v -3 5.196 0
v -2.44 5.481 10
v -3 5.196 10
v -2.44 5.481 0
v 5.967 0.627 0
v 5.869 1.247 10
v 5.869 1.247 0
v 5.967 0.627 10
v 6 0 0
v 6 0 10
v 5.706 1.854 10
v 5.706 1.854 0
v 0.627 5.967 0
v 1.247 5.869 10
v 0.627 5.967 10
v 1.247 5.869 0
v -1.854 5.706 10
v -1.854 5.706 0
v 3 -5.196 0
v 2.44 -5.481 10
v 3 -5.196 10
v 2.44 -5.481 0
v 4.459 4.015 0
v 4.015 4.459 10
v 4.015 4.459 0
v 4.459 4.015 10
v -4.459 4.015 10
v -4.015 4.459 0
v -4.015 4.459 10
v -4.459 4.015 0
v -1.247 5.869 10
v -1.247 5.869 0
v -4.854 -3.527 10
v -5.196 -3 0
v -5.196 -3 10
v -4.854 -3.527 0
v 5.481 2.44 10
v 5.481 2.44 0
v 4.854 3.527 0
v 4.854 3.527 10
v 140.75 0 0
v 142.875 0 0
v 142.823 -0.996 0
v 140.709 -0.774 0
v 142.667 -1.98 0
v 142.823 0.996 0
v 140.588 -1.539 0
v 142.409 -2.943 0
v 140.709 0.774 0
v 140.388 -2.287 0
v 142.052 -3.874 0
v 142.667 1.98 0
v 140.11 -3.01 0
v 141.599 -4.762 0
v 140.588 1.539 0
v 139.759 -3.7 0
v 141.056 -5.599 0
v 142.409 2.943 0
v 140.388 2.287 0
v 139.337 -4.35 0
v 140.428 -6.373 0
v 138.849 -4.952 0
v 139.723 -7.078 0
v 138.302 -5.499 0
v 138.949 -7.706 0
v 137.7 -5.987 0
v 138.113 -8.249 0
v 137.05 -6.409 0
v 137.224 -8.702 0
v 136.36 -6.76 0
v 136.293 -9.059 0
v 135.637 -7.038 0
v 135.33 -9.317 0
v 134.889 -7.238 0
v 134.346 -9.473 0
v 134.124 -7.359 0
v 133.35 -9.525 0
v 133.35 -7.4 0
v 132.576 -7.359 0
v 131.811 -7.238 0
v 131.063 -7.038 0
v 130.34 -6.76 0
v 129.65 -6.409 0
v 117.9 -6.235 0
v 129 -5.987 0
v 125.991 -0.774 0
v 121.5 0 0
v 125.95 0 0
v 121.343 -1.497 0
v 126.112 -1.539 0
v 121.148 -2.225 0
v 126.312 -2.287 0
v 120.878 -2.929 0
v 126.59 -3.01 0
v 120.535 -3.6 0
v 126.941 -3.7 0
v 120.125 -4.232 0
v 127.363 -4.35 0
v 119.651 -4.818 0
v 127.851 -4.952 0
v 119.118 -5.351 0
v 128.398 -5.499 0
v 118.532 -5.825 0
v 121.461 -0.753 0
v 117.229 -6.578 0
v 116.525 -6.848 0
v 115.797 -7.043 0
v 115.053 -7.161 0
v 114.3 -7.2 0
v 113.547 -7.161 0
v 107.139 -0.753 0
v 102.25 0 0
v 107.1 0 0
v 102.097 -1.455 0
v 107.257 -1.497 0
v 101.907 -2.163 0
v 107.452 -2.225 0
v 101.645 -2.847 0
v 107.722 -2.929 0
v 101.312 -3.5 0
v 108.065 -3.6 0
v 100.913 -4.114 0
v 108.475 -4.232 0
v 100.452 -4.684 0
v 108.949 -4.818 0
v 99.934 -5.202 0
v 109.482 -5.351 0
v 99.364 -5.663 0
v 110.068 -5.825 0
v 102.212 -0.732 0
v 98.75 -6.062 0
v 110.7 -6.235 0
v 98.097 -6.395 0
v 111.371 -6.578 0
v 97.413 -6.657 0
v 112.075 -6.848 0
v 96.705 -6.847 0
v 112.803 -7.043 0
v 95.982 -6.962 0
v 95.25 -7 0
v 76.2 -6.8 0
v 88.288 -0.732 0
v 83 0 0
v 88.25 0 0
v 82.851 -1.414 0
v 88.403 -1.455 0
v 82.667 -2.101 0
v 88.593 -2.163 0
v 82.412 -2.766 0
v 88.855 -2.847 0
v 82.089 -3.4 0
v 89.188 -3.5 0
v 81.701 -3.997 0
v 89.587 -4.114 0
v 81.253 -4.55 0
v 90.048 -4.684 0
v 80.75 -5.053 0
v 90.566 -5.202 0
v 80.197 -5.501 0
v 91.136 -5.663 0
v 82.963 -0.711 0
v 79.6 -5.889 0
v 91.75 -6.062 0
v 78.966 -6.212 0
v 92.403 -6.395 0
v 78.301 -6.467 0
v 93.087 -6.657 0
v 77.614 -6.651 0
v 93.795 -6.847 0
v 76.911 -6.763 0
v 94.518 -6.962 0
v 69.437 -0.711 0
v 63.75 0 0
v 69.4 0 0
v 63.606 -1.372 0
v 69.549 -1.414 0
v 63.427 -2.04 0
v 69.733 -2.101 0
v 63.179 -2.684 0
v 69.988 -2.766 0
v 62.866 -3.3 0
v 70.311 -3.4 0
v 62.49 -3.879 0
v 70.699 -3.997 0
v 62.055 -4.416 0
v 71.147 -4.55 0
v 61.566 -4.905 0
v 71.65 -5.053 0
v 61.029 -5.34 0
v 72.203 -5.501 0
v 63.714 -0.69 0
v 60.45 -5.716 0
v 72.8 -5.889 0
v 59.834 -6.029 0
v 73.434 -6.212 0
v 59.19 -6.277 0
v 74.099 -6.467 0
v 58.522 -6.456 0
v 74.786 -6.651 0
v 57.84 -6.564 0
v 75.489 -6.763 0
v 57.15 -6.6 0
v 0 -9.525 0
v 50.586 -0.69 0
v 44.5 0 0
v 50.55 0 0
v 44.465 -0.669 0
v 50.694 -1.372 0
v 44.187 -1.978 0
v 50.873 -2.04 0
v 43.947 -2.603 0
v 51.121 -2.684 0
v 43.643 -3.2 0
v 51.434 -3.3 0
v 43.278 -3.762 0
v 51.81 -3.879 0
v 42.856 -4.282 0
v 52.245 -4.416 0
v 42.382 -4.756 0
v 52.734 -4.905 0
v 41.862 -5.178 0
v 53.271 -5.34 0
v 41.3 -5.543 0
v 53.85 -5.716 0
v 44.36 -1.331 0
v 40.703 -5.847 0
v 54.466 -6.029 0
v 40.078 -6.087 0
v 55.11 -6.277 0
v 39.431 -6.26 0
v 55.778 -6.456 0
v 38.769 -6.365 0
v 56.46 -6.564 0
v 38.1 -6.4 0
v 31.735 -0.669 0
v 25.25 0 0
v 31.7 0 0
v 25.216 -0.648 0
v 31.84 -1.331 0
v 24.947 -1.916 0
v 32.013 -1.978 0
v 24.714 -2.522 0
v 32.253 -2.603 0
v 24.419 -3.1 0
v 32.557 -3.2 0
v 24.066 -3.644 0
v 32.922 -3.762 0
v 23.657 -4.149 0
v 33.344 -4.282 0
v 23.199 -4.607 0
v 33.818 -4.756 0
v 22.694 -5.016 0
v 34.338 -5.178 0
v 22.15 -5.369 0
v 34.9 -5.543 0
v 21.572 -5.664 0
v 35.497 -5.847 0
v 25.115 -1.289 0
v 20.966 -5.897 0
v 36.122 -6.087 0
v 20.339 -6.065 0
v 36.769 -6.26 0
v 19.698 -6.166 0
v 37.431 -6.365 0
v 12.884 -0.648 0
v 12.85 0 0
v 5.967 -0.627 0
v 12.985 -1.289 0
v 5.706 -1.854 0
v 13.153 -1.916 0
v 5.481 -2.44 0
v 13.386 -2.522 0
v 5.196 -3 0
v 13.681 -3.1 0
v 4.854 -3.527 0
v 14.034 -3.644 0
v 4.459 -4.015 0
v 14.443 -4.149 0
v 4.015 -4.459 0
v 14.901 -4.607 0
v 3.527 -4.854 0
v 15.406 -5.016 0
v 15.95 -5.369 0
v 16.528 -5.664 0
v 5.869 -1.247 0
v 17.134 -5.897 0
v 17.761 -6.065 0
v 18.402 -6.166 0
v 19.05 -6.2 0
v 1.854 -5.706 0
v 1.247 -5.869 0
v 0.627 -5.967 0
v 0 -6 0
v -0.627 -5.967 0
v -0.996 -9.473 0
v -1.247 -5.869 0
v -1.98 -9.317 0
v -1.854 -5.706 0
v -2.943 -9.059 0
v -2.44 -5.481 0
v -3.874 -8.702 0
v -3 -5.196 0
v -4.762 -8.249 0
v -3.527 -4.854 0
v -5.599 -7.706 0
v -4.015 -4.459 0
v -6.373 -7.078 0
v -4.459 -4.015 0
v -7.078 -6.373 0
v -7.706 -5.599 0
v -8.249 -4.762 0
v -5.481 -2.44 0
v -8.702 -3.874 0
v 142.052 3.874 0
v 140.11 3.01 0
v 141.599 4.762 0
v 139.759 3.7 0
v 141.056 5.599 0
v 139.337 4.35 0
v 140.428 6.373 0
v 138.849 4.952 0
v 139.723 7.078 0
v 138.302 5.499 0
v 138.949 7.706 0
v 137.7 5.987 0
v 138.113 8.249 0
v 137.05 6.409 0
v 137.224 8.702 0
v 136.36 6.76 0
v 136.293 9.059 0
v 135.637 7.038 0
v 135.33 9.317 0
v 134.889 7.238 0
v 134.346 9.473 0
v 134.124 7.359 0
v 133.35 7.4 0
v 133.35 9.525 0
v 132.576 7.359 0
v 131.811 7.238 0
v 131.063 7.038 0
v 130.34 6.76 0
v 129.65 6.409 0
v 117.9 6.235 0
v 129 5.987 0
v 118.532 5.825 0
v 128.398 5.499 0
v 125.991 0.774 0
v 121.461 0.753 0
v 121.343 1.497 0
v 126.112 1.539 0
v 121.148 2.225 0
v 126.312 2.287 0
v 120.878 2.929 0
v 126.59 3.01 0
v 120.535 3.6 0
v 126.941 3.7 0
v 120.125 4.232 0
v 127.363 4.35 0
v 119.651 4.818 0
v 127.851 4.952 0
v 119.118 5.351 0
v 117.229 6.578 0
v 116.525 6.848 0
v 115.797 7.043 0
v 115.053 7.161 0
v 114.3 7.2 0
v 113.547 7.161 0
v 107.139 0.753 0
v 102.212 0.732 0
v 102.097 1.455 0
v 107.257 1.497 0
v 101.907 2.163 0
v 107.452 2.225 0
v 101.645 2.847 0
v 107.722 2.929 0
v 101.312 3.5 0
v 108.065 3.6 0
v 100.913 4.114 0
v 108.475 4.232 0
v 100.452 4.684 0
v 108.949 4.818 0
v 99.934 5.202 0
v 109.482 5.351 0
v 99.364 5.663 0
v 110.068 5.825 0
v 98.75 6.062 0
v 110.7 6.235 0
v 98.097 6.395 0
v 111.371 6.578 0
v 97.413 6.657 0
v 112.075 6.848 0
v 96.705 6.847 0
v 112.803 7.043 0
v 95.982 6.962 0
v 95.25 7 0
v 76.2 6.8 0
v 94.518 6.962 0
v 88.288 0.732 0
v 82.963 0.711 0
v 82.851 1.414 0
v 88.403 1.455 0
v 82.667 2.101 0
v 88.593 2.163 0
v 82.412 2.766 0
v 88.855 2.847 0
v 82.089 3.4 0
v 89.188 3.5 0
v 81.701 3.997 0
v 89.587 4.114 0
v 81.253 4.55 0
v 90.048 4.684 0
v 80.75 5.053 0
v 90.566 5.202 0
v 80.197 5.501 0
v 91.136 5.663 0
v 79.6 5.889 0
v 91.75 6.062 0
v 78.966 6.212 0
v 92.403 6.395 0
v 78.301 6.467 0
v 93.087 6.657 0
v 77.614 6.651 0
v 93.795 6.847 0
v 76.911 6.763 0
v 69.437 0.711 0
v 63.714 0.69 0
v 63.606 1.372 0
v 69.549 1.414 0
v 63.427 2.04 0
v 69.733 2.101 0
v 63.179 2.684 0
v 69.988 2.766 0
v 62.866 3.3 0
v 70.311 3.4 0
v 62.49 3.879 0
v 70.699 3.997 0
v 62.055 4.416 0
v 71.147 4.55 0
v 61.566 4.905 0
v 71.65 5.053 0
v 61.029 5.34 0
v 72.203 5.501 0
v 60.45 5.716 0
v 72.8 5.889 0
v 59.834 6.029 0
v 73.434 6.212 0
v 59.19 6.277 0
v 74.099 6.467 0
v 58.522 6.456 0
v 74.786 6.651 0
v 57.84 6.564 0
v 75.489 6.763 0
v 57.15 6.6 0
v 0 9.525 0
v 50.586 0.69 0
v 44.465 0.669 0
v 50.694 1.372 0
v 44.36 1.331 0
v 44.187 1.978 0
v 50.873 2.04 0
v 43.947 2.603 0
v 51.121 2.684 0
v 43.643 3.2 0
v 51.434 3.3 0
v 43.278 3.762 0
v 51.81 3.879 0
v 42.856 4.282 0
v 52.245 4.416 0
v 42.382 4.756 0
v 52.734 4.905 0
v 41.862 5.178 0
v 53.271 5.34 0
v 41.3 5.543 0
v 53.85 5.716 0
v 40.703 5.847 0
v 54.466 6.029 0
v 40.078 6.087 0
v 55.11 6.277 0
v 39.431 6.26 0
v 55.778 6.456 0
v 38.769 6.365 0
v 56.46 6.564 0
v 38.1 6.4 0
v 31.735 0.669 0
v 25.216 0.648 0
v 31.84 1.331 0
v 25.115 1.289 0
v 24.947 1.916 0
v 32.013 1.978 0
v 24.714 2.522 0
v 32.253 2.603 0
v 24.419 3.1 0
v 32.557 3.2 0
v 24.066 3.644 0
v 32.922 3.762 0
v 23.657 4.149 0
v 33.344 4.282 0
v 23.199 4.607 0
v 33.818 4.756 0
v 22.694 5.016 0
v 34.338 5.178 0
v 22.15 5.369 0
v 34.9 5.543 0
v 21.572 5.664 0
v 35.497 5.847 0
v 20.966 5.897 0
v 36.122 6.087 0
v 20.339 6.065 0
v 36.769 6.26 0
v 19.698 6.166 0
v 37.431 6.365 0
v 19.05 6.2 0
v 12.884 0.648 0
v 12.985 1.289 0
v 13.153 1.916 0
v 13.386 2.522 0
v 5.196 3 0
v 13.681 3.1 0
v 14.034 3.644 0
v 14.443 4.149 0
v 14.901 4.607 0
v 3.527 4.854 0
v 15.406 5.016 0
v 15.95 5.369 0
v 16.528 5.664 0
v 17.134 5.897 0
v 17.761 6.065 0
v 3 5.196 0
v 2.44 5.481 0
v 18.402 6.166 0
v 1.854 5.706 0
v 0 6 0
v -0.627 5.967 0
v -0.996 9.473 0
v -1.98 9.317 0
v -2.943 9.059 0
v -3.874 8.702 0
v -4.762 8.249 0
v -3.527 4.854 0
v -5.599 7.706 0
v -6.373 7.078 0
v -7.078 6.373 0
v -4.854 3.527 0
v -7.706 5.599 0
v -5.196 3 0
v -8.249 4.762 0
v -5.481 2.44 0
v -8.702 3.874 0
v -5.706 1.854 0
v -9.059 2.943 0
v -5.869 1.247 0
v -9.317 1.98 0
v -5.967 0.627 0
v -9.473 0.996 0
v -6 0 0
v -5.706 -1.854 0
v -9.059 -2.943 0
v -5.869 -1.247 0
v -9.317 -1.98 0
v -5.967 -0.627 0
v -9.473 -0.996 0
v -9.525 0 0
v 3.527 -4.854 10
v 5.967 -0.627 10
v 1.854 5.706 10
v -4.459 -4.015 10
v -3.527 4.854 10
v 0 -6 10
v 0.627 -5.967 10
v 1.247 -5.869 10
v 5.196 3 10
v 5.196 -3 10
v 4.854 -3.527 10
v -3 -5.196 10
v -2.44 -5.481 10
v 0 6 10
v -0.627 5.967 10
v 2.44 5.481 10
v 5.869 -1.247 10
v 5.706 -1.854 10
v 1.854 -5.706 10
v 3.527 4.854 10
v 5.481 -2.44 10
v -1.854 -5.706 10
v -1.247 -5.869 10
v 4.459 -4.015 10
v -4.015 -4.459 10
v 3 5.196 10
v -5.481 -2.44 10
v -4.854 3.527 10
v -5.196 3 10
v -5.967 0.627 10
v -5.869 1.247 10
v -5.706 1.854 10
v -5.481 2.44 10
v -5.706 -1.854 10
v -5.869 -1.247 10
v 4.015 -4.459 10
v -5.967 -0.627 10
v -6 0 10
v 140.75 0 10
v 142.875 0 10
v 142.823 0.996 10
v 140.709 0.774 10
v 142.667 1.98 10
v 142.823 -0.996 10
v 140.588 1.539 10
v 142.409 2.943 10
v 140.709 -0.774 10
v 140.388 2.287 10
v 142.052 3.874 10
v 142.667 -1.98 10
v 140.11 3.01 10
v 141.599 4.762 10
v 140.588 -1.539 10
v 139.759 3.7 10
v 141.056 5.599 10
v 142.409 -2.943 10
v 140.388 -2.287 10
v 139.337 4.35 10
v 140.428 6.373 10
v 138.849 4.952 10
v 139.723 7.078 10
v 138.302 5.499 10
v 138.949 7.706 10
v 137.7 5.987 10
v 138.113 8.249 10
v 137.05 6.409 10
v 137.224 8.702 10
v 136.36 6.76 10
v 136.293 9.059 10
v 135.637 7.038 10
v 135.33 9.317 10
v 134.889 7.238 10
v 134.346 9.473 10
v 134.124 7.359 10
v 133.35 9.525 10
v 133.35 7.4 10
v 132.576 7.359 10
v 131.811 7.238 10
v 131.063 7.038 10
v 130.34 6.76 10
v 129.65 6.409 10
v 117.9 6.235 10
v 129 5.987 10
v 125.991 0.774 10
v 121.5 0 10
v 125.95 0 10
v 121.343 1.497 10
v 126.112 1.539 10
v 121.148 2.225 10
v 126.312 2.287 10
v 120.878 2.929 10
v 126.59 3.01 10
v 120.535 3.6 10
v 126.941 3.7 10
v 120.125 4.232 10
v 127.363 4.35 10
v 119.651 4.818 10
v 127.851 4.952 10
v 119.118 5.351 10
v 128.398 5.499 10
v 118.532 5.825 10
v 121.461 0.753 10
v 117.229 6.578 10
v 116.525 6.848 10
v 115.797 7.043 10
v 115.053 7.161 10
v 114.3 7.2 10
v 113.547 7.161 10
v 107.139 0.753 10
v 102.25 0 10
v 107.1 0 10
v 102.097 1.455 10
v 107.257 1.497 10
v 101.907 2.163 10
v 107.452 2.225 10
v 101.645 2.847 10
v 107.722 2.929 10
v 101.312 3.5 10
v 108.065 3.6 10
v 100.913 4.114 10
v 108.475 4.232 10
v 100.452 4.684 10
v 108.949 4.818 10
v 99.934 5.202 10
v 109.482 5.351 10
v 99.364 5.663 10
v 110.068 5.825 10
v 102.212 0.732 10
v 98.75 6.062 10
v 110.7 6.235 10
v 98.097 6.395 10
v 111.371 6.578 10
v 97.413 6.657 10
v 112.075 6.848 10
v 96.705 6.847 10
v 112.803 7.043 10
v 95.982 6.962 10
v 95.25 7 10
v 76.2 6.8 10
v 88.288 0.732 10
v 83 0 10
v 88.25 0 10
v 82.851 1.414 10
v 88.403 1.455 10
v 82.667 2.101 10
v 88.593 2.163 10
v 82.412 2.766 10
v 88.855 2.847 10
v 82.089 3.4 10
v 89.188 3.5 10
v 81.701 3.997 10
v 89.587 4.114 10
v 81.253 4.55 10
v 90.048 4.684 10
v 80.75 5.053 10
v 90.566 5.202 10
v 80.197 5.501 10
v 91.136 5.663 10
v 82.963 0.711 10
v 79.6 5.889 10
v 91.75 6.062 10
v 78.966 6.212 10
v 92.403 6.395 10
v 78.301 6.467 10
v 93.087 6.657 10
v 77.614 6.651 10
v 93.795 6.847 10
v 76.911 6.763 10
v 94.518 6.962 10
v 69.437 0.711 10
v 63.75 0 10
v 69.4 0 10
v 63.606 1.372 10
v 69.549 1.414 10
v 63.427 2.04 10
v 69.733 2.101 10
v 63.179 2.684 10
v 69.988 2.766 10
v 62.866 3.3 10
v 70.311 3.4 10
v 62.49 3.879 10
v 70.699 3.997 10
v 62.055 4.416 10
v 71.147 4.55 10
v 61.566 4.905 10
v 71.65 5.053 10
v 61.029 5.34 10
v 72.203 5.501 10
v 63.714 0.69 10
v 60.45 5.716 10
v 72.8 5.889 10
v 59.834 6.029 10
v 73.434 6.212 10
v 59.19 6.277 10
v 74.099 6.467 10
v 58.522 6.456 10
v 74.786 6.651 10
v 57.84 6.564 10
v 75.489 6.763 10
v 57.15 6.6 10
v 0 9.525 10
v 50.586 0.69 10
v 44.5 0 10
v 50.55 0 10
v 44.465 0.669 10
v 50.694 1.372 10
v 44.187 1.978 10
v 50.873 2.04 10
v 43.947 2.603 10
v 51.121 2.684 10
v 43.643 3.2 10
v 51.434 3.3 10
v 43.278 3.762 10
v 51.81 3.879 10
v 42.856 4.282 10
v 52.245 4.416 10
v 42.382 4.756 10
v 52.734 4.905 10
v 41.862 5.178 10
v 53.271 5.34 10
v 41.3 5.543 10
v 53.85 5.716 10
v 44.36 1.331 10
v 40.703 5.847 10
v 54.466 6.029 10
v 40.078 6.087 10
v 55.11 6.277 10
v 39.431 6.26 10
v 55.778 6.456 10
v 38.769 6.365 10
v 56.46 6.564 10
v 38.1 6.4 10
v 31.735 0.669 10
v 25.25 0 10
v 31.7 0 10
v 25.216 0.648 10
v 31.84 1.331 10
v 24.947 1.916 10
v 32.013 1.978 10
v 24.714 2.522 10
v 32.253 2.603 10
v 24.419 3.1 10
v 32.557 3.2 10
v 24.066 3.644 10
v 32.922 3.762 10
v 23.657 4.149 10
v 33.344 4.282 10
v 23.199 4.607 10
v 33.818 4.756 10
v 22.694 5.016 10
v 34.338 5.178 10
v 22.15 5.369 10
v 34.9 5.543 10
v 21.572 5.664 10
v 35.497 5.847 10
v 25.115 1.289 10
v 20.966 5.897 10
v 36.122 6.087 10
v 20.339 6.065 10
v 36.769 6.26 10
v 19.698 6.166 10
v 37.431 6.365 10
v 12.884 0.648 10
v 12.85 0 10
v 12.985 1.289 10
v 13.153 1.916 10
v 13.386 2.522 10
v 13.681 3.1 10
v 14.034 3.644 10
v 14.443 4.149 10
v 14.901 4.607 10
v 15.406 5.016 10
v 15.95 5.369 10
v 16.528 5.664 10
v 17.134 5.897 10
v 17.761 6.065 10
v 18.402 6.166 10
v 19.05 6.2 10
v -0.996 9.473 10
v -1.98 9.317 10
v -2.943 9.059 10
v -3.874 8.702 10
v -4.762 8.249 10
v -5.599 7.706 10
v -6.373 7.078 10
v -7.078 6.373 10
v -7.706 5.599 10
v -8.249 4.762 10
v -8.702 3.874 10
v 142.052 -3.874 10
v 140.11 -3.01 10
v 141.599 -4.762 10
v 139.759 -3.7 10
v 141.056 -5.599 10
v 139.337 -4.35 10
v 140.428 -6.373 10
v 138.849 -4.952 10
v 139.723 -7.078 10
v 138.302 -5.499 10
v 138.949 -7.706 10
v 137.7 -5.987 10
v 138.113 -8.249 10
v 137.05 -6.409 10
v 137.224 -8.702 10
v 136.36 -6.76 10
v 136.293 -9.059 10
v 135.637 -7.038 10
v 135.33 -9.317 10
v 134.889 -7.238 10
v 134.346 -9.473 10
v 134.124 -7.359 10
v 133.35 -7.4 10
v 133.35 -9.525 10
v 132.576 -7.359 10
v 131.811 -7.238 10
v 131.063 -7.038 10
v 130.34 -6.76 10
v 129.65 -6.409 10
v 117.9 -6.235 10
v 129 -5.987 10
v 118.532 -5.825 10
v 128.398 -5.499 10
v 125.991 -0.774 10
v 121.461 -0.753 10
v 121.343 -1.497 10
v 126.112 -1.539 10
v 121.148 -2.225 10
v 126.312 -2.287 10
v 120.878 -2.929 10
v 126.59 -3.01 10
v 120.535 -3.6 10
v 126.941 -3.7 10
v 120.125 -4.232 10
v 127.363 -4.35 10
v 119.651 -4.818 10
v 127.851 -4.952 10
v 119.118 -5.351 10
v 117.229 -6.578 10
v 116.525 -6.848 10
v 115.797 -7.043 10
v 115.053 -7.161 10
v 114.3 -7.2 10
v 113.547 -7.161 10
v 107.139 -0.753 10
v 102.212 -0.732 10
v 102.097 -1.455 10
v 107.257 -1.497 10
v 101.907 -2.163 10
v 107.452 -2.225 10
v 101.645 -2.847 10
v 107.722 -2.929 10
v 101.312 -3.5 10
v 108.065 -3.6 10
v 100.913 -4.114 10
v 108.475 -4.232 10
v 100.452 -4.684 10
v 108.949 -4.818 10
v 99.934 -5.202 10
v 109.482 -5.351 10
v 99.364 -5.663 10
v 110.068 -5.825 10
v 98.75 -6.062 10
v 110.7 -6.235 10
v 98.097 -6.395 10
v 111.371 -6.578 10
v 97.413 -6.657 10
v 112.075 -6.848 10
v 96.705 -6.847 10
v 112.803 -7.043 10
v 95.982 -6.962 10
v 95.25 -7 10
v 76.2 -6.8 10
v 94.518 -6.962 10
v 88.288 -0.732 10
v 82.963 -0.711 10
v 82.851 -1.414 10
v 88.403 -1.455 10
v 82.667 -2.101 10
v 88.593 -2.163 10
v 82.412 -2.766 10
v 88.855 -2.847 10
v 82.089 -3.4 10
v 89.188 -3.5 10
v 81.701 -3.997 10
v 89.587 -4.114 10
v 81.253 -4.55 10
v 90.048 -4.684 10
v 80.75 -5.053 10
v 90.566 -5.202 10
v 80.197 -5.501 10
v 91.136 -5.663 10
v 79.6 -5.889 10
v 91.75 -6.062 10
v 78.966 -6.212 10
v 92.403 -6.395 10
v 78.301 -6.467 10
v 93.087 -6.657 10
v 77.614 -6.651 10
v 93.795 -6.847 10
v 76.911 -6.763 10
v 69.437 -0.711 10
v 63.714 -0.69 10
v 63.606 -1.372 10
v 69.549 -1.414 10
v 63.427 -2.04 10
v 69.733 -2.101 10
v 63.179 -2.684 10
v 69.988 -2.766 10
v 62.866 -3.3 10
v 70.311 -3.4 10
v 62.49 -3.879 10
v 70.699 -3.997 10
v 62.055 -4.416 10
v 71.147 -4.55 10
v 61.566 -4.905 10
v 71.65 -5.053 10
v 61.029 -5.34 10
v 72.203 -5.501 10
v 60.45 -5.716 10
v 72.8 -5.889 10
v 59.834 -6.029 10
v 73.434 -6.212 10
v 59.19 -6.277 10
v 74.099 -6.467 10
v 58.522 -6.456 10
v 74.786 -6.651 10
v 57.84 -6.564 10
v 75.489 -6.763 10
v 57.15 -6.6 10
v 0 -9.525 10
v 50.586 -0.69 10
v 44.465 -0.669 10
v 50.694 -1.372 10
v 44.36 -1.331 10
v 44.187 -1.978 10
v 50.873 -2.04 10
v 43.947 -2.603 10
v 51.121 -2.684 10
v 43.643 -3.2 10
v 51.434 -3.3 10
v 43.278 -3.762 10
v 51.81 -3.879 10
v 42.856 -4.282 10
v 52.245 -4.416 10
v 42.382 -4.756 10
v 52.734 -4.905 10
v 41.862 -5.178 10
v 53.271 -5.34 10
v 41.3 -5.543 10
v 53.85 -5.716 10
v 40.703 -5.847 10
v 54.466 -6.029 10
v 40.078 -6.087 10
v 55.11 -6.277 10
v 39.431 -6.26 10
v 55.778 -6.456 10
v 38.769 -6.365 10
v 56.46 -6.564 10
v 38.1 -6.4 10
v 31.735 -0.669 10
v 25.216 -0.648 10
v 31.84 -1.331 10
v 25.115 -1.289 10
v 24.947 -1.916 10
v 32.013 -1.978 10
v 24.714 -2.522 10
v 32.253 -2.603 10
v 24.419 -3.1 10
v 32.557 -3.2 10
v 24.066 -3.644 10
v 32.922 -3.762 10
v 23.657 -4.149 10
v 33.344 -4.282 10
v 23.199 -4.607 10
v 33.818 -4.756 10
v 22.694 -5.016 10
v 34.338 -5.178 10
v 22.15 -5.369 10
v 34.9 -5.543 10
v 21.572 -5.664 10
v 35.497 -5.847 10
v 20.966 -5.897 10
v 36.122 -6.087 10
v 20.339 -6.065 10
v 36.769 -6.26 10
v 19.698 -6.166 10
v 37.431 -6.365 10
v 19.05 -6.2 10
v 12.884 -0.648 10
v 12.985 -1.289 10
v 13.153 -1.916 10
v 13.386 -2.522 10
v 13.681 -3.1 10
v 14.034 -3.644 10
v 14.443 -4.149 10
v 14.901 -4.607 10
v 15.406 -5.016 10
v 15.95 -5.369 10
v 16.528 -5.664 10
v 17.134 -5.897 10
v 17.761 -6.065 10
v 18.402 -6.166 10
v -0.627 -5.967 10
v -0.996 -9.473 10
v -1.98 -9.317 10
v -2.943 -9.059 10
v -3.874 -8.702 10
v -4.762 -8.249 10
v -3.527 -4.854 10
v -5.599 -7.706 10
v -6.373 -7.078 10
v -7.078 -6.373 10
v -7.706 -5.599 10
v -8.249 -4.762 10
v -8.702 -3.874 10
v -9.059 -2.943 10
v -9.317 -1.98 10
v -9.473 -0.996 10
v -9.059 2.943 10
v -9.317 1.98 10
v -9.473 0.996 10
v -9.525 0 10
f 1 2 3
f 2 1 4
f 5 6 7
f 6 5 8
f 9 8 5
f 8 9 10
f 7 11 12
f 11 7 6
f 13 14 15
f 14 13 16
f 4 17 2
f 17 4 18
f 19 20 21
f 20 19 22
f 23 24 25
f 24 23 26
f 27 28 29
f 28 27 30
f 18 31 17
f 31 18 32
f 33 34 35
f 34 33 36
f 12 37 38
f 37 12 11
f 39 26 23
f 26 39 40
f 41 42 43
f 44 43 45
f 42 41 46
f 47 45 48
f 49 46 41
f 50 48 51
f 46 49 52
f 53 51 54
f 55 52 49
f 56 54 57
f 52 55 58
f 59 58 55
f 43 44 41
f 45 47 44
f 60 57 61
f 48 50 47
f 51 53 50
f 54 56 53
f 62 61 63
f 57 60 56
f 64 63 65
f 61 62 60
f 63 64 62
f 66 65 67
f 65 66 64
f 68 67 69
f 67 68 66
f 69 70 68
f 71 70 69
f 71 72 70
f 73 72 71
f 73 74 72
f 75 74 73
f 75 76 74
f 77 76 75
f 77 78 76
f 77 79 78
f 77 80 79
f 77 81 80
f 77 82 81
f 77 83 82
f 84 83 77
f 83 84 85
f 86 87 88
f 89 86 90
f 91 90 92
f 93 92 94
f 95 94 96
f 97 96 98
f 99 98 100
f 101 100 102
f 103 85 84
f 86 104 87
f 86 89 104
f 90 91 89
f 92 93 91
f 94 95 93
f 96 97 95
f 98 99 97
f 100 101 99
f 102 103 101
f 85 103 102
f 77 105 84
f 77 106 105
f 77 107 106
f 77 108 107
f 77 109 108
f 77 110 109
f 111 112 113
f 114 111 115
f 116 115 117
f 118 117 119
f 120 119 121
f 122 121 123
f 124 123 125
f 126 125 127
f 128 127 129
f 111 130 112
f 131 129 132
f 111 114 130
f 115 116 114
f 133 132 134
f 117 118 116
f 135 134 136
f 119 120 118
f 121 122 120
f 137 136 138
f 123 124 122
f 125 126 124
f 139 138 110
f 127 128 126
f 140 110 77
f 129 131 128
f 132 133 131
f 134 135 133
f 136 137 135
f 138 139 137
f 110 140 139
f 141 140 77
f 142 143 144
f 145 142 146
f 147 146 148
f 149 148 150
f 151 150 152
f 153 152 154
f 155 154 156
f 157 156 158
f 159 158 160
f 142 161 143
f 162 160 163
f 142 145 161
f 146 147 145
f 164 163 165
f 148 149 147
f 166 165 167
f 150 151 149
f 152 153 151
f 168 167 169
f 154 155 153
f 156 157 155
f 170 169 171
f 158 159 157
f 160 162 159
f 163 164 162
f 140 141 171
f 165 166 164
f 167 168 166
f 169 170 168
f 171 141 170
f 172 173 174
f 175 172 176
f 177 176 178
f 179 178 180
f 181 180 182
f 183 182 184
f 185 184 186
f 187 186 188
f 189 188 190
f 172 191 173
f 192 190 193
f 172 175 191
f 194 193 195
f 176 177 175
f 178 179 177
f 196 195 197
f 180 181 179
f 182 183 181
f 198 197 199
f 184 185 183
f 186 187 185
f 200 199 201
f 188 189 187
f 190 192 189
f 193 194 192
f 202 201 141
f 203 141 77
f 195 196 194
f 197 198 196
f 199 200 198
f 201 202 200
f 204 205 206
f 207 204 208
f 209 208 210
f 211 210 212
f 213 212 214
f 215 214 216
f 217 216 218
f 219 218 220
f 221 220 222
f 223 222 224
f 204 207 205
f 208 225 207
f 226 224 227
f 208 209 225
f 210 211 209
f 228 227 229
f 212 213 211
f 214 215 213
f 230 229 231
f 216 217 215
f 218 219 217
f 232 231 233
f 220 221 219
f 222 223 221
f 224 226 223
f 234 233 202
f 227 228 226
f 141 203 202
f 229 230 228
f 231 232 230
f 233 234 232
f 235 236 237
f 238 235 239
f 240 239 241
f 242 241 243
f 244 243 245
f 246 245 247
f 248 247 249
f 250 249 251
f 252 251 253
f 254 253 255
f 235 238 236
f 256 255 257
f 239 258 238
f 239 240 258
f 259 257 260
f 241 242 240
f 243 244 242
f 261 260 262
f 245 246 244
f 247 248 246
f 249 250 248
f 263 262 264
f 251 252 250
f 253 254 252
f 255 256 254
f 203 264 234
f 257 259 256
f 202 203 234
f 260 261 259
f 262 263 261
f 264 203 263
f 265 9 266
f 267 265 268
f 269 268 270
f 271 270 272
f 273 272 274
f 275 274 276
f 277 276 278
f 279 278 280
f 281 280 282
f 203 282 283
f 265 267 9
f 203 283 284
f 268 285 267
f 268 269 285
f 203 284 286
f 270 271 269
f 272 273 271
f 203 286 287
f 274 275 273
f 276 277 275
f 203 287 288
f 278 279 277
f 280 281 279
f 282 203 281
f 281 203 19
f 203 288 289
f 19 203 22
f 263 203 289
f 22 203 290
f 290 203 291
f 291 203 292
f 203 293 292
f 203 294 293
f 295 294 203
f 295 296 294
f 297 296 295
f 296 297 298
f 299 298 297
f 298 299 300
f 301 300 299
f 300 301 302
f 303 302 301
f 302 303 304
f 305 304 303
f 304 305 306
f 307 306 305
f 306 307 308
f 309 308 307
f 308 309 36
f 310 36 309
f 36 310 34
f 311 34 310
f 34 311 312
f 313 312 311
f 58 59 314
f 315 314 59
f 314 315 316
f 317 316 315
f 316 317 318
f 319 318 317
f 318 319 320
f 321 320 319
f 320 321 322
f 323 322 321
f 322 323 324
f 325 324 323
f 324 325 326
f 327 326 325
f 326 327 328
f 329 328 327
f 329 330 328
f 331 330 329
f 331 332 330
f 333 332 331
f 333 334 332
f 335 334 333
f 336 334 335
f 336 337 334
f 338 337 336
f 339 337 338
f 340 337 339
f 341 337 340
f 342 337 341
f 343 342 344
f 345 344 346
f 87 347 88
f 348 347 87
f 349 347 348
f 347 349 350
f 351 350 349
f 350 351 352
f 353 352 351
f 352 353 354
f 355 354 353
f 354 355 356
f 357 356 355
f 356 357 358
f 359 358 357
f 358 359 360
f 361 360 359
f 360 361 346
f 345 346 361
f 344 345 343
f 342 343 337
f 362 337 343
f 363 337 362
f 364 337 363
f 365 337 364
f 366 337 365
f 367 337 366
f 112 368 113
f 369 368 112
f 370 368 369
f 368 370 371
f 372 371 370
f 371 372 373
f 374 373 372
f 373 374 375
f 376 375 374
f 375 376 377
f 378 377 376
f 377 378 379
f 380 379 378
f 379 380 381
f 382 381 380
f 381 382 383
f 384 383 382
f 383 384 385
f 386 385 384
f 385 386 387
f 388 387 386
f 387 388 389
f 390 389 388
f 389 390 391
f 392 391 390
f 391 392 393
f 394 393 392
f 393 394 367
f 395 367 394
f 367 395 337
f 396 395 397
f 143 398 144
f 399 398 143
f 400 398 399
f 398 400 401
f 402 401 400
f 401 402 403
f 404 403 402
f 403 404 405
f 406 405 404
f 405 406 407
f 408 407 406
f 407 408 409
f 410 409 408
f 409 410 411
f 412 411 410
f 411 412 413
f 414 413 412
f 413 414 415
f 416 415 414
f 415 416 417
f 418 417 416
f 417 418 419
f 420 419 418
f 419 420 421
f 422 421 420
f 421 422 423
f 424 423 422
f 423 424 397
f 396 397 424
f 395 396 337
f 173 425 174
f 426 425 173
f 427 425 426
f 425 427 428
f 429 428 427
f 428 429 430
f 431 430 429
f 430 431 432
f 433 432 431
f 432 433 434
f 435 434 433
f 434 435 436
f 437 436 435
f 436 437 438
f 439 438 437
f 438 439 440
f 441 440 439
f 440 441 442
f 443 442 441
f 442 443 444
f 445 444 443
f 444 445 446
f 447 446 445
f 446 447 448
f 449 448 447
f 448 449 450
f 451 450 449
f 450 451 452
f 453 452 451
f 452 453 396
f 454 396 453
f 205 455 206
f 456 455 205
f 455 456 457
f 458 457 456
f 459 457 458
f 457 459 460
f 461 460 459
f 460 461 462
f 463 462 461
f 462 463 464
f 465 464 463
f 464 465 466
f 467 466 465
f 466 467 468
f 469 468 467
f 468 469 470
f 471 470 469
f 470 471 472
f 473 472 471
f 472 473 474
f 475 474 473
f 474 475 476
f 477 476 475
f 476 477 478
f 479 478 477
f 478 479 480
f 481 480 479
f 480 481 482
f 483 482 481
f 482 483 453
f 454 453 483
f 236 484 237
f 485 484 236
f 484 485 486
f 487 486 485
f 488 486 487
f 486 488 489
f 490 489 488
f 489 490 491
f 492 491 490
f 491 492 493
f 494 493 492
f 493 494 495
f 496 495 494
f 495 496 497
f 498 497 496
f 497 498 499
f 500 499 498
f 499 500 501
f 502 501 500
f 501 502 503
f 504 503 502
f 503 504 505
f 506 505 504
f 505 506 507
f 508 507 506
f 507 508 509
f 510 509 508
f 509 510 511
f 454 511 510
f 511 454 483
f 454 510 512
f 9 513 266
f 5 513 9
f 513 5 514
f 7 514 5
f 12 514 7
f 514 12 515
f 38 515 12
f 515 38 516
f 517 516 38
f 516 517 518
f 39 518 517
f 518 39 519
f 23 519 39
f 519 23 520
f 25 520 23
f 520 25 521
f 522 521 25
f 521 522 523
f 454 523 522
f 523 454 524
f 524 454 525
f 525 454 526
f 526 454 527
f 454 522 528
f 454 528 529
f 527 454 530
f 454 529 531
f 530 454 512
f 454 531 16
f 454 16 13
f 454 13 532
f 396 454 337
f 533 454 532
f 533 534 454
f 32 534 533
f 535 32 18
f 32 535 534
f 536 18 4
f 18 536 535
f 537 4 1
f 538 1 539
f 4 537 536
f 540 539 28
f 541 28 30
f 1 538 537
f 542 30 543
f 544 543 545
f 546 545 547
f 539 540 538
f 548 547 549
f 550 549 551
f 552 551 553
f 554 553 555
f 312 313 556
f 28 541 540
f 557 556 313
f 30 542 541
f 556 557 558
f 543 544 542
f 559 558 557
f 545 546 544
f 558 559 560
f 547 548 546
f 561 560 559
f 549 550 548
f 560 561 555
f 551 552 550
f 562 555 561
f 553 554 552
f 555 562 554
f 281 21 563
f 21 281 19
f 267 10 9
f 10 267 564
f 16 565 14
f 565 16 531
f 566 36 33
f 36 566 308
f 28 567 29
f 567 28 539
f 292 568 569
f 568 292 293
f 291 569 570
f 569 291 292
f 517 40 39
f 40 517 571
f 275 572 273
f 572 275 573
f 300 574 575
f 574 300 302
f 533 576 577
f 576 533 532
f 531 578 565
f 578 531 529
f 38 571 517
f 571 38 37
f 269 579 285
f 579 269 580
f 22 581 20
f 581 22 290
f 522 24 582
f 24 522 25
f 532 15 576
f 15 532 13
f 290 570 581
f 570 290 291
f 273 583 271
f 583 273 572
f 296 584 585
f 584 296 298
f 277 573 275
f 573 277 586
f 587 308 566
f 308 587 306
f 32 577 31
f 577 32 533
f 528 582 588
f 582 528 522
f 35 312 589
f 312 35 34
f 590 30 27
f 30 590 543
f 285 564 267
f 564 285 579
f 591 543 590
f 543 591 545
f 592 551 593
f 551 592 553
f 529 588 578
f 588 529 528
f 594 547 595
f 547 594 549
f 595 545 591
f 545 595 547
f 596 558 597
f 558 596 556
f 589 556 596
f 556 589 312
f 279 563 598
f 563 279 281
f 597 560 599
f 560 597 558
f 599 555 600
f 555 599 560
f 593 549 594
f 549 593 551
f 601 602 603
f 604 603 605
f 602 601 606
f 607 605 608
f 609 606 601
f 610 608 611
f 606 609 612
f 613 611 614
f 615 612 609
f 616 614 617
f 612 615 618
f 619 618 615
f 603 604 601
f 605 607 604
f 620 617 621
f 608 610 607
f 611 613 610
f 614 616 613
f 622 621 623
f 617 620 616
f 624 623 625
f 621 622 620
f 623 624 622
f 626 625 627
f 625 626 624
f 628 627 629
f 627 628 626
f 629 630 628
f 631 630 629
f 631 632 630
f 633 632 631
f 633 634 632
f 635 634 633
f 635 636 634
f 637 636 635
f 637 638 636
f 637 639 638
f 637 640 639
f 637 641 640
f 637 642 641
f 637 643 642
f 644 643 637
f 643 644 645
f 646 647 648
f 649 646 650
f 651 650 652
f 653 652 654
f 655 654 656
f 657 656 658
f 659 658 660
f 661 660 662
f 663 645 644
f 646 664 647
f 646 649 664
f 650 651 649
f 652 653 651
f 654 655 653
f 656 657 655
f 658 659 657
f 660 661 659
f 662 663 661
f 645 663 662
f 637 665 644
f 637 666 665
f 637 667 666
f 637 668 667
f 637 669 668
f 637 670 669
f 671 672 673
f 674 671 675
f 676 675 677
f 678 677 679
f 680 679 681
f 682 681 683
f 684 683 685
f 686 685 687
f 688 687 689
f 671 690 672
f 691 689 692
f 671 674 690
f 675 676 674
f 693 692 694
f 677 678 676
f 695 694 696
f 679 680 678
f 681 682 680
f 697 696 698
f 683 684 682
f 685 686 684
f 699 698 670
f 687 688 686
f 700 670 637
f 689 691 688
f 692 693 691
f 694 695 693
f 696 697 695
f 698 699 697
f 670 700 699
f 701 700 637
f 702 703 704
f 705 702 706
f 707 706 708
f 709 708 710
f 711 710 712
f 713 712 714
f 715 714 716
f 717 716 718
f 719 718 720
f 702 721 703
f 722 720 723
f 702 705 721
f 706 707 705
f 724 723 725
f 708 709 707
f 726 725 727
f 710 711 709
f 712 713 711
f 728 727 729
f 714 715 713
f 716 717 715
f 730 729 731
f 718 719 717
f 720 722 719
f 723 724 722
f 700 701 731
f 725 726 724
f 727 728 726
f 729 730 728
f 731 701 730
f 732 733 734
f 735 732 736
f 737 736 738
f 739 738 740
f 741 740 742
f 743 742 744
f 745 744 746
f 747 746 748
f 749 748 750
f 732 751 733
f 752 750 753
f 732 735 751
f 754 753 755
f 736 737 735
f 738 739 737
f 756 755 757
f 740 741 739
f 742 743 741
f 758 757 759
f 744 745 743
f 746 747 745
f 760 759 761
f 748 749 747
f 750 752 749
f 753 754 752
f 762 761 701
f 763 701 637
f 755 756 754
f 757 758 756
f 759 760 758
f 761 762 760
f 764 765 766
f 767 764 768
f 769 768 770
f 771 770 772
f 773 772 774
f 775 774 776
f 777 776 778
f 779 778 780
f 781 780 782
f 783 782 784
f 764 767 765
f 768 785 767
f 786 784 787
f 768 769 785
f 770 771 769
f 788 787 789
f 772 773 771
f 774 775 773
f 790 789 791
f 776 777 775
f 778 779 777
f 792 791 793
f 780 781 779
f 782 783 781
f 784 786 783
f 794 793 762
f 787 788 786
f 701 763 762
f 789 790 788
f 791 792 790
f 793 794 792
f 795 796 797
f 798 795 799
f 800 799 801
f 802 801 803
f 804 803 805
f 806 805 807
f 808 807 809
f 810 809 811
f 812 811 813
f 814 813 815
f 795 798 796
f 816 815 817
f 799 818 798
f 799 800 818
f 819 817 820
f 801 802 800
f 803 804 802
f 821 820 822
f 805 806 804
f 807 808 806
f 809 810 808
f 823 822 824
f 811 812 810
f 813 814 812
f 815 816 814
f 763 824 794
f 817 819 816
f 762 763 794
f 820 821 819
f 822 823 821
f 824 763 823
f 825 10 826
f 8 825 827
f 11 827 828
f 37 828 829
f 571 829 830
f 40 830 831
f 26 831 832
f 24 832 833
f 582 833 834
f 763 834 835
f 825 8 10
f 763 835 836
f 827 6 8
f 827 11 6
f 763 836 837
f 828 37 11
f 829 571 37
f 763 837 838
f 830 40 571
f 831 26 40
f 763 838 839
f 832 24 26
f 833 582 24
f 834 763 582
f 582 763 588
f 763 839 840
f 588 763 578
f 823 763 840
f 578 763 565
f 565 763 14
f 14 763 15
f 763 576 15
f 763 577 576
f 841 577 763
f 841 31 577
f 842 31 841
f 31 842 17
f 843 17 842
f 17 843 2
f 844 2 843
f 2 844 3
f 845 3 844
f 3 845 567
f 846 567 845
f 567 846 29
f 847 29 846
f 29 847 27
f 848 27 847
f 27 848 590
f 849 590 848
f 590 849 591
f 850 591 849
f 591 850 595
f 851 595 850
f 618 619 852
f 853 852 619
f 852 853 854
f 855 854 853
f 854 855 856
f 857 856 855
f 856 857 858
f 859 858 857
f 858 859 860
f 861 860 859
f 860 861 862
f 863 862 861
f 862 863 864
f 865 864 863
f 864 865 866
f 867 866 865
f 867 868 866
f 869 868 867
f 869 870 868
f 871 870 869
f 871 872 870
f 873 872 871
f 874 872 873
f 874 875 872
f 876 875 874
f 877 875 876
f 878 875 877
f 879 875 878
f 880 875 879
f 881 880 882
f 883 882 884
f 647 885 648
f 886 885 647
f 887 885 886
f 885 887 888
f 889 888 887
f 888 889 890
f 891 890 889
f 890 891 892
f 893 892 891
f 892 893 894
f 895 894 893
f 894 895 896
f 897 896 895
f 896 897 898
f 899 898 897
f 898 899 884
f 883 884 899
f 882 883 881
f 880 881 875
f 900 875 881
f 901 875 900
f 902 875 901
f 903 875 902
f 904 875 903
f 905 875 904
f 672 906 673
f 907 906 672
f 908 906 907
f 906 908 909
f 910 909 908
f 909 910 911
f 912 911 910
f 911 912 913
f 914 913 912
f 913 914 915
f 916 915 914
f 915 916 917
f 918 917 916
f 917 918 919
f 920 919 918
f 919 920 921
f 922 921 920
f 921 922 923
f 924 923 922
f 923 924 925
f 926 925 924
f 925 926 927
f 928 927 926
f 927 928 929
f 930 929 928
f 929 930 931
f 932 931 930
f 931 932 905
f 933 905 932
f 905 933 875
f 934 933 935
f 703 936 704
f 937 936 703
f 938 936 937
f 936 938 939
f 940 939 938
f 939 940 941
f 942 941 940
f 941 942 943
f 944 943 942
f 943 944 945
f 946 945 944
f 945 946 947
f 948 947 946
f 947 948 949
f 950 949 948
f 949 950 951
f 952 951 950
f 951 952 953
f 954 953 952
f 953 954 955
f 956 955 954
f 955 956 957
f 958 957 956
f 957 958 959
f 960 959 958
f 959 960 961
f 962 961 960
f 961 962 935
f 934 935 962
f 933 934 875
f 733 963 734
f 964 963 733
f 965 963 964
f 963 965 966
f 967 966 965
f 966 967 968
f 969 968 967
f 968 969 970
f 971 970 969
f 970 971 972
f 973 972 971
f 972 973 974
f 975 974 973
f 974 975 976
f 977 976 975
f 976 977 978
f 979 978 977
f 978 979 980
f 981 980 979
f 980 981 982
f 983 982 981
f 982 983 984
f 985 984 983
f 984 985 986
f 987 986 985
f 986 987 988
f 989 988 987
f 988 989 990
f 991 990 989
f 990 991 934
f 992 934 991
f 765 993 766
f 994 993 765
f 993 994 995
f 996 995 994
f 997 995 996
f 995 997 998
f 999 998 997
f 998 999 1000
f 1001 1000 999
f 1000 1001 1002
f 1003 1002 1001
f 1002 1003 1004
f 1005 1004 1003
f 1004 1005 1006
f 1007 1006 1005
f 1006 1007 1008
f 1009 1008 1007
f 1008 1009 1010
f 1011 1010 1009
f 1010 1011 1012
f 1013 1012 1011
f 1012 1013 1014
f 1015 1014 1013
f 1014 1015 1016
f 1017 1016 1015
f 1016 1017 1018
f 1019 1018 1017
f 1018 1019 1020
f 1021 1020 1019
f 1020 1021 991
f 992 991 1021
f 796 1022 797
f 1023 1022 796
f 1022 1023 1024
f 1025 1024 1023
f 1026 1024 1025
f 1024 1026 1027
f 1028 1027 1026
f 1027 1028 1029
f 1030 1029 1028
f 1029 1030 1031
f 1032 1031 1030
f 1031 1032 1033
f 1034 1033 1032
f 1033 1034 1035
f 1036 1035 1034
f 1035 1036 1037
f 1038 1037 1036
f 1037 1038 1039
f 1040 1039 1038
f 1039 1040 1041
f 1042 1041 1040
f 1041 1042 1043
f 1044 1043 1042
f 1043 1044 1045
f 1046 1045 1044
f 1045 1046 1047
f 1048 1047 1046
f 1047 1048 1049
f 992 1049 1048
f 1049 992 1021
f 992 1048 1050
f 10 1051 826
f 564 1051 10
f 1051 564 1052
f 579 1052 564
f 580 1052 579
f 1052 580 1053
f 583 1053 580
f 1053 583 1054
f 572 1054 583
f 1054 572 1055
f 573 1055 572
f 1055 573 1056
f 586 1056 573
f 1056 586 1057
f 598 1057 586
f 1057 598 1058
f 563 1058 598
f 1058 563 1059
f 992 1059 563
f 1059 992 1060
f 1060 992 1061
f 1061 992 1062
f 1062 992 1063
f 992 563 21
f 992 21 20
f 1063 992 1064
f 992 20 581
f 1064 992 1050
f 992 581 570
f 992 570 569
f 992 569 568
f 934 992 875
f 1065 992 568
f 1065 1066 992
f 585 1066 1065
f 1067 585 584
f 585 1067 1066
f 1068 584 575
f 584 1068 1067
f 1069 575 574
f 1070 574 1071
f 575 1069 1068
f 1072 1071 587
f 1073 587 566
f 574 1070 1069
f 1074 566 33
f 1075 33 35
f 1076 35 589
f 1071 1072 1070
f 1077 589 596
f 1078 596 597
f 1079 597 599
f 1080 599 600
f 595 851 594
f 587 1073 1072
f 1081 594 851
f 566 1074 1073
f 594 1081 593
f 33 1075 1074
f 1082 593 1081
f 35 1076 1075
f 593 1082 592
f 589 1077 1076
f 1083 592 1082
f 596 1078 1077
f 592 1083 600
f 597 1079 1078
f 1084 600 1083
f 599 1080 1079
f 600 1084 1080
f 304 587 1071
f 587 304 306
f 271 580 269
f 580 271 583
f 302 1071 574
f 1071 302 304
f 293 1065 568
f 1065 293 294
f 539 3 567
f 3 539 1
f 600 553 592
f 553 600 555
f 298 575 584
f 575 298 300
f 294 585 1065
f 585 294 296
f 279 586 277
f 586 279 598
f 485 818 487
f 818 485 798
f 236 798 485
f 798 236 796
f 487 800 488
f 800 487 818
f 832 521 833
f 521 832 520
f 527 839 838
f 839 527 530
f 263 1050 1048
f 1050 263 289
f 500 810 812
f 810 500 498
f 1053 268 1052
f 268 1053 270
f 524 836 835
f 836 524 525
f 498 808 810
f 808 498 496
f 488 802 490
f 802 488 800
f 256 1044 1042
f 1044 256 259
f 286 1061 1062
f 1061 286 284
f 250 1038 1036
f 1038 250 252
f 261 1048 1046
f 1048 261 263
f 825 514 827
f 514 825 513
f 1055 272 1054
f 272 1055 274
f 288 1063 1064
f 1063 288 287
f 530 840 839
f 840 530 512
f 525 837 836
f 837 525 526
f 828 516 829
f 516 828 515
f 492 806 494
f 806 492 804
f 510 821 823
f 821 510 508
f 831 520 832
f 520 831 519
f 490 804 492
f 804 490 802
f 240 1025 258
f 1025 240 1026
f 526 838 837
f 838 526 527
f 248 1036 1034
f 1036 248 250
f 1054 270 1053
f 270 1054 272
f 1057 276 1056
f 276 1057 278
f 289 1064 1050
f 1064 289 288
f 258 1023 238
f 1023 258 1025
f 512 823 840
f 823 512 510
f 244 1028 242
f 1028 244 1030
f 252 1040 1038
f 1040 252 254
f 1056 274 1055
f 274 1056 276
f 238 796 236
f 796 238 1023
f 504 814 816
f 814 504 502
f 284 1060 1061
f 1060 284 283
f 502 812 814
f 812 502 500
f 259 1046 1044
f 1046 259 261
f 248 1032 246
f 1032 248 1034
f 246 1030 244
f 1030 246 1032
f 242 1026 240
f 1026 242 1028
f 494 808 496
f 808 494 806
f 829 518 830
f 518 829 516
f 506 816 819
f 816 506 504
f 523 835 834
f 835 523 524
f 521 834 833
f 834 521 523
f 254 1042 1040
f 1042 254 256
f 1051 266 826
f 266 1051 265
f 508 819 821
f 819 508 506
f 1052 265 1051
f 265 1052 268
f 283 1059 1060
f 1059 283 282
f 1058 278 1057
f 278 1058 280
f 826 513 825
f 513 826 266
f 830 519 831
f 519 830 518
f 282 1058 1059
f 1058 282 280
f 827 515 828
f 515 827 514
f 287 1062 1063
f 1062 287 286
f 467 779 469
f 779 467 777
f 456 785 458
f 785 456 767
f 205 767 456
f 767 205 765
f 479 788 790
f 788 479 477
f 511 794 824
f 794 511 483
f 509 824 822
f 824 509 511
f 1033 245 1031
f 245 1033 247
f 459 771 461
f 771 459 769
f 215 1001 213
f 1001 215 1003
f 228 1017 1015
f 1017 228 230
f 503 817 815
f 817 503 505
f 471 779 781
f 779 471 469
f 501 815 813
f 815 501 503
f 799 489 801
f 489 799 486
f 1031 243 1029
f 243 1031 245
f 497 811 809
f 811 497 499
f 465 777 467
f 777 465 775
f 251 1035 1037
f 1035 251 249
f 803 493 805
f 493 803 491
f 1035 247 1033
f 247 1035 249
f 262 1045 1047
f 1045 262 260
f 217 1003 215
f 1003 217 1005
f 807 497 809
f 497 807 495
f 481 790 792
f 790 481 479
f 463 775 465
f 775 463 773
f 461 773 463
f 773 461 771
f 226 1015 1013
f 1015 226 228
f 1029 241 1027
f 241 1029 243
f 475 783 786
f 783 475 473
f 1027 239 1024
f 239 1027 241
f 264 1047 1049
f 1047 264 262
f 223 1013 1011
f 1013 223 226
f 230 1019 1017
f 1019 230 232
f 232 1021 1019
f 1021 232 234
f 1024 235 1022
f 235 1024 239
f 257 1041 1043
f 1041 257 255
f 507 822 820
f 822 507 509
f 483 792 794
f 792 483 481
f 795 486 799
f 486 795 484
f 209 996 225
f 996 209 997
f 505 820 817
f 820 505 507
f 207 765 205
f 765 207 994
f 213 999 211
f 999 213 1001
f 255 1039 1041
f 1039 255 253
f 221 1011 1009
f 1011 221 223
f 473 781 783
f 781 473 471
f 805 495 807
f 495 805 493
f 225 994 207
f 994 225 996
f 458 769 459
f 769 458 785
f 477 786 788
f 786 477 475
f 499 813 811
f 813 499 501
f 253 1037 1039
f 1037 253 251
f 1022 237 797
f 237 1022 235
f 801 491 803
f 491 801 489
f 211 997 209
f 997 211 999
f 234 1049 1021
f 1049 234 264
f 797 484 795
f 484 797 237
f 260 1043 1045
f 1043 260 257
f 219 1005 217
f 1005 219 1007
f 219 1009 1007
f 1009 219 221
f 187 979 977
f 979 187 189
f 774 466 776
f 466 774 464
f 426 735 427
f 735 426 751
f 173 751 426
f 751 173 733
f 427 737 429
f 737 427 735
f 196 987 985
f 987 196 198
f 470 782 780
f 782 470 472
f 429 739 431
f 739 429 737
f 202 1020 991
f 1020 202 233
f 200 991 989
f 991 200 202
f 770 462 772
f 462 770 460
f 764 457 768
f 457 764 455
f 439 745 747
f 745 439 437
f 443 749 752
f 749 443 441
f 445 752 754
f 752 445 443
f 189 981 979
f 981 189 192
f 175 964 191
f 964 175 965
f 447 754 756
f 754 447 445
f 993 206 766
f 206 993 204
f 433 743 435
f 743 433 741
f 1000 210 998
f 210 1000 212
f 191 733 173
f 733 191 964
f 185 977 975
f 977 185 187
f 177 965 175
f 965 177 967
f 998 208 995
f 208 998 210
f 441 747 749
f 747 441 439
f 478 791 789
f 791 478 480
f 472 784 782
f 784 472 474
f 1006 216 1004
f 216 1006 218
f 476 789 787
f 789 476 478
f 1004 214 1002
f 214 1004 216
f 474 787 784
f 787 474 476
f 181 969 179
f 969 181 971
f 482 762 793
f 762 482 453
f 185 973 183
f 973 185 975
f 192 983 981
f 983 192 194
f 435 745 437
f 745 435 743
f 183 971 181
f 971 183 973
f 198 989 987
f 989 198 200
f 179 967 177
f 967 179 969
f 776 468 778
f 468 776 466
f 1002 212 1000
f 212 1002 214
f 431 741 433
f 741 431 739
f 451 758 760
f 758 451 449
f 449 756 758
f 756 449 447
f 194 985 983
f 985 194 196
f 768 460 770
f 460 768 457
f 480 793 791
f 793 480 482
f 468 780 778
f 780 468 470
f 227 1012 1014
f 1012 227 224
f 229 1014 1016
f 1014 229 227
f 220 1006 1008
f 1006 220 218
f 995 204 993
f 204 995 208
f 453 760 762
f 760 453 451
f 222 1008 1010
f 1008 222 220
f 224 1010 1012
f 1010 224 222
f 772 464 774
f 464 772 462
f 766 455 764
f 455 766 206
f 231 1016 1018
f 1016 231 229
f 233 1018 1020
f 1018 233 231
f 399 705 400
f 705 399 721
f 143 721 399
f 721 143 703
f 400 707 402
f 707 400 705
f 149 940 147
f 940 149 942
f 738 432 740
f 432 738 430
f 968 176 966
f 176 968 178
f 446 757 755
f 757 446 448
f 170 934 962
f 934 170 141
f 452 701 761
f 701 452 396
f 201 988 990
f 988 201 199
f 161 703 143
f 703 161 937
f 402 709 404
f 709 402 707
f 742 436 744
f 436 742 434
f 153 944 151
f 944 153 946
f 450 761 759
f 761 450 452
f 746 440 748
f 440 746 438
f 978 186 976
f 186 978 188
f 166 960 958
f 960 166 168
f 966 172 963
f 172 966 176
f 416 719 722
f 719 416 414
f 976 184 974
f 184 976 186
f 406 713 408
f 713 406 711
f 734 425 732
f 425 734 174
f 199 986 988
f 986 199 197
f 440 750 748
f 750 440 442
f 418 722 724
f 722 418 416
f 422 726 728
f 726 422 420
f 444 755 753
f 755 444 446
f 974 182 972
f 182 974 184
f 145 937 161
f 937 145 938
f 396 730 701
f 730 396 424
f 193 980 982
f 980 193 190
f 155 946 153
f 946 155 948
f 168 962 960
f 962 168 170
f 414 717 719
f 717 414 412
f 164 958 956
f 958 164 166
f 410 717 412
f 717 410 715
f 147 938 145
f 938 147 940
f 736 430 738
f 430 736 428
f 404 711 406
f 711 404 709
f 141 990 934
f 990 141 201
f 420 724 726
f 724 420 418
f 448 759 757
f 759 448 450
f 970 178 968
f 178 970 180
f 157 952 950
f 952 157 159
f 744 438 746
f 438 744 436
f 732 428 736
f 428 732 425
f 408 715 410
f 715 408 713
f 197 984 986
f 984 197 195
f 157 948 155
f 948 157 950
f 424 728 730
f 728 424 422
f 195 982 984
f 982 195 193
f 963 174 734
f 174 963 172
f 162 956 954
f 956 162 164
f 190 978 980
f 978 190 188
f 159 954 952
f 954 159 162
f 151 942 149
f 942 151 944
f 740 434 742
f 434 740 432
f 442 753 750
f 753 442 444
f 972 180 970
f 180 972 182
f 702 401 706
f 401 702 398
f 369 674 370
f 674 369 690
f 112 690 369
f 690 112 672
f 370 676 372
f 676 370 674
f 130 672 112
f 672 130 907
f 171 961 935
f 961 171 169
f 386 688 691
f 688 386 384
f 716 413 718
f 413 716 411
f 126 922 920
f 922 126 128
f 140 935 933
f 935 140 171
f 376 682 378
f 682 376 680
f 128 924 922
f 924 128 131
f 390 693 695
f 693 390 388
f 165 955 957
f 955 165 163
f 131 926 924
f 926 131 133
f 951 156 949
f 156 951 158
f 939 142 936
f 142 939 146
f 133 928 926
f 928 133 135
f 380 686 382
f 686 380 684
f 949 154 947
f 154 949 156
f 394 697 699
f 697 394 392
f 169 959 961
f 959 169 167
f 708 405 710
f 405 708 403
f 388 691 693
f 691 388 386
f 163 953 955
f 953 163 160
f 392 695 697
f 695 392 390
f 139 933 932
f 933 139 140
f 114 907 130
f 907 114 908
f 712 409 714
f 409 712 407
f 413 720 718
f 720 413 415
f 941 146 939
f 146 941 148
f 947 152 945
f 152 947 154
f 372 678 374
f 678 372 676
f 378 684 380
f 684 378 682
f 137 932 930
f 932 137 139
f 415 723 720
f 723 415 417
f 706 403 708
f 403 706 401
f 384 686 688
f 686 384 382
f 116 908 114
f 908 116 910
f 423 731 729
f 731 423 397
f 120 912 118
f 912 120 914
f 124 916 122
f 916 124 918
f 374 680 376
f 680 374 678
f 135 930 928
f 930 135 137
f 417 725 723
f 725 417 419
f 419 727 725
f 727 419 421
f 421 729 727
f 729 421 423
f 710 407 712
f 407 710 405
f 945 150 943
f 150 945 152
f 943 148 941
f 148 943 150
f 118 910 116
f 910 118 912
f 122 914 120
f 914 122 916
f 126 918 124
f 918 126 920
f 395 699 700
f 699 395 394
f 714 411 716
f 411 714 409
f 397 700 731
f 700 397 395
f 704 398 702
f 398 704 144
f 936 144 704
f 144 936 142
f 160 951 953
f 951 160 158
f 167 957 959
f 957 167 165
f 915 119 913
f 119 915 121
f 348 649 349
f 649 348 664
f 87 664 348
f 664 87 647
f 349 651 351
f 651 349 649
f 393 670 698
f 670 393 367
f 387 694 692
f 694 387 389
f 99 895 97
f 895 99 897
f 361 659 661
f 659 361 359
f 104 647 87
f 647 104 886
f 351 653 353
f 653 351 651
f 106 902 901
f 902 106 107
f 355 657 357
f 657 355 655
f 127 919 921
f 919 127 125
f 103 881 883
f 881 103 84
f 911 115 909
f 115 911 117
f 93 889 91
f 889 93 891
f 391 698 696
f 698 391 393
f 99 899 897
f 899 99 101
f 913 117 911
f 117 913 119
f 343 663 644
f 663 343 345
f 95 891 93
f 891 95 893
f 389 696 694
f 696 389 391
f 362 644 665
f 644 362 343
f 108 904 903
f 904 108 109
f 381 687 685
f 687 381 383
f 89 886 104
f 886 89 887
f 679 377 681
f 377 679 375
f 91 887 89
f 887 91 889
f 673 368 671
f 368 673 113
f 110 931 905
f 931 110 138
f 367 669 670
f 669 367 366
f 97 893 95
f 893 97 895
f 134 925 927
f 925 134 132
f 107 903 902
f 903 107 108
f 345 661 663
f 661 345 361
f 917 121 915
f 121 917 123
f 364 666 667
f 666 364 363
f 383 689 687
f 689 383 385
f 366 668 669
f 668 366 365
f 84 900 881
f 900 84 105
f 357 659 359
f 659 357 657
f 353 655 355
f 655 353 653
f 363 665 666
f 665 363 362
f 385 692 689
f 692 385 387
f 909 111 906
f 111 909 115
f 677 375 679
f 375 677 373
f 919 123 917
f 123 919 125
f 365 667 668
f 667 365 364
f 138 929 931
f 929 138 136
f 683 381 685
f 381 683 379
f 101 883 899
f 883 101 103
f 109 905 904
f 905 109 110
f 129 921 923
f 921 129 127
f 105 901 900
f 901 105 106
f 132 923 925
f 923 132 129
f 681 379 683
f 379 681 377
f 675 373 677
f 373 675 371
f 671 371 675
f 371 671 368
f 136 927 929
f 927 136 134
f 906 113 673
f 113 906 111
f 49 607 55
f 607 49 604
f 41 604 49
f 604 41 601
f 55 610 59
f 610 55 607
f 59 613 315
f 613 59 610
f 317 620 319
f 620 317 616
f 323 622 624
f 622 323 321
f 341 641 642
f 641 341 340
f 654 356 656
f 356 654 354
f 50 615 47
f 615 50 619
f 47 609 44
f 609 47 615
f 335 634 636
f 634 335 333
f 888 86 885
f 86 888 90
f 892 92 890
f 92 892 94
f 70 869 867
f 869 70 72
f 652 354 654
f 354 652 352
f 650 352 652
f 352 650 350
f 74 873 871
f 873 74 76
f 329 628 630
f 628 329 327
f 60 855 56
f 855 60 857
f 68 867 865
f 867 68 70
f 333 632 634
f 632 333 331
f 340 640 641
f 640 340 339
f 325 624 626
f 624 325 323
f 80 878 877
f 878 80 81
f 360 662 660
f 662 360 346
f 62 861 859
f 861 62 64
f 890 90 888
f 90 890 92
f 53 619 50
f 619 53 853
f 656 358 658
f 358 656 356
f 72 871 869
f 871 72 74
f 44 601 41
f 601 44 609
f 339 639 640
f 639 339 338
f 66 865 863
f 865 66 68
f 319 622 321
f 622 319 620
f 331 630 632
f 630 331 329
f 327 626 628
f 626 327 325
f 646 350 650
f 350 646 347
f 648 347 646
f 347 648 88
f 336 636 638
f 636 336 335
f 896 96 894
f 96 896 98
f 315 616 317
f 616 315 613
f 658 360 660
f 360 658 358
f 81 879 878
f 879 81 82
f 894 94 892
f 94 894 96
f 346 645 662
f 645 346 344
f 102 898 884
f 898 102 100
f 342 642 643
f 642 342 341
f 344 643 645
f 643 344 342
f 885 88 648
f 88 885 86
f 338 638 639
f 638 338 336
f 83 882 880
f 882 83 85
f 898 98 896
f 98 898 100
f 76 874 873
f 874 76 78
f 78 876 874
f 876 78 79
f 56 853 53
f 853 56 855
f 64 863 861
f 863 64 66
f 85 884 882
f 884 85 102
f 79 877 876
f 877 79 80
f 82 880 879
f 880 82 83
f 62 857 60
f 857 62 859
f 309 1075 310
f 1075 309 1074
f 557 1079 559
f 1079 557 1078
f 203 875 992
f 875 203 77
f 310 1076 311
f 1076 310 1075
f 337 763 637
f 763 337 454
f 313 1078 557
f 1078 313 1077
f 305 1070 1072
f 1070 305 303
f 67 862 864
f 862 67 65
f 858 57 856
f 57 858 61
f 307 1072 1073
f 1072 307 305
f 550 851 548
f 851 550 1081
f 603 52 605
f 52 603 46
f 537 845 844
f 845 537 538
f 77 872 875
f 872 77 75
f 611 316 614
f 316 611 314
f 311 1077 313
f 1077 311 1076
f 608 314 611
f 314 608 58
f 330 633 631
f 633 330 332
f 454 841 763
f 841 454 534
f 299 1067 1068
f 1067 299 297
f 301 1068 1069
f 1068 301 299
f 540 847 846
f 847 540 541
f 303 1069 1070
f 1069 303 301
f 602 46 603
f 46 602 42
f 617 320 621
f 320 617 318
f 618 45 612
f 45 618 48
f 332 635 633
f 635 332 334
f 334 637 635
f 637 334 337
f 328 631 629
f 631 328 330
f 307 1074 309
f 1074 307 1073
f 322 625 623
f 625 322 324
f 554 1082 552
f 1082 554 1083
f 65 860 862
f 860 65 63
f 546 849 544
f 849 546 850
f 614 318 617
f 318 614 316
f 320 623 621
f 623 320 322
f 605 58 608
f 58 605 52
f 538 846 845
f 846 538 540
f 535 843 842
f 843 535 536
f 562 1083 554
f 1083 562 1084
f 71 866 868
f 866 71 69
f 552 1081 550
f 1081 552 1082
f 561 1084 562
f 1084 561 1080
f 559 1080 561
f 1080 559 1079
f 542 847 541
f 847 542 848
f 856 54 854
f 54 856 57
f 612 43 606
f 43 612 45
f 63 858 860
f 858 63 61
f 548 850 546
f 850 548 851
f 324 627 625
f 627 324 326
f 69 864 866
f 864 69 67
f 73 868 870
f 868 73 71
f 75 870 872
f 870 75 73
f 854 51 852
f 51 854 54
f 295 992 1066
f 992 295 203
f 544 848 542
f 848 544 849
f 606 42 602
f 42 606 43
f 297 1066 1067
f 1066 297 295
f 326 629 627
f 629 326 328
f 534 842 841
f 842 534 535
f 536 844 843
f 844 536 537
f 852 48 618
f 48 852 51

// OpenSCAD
// Dimensions for my KSGER handle:
// Outer diameter: 13.9mm
// Shaft diameter: 11.9mm
// Shaft length: 60mm

$fn=60;

// Test for various diameters to see what actually fits.
module collar_test() {
  thickness = 10;
  ds = [for (d = [12 : .4 : 15]) d];
  lds = len(ds);
  dmin = ds[0];
  dmax = ds[lds - 1];
  collar = 19.05;
  difference() {
    hull() {
      cylinder(r=collar / 2, h=thickness);
      translate([collar * (lds - 1), 0, 0]) {
        cylinder(r=collar / 2, h=thickness);
      }
    }
    for (i = [0 : lds - 1]) {
      translate([collar * i, 0, 0]) {
        cylinder(r=ds[i] / 2, h=thickness);
      }
    }
  }
}
collar_test();
